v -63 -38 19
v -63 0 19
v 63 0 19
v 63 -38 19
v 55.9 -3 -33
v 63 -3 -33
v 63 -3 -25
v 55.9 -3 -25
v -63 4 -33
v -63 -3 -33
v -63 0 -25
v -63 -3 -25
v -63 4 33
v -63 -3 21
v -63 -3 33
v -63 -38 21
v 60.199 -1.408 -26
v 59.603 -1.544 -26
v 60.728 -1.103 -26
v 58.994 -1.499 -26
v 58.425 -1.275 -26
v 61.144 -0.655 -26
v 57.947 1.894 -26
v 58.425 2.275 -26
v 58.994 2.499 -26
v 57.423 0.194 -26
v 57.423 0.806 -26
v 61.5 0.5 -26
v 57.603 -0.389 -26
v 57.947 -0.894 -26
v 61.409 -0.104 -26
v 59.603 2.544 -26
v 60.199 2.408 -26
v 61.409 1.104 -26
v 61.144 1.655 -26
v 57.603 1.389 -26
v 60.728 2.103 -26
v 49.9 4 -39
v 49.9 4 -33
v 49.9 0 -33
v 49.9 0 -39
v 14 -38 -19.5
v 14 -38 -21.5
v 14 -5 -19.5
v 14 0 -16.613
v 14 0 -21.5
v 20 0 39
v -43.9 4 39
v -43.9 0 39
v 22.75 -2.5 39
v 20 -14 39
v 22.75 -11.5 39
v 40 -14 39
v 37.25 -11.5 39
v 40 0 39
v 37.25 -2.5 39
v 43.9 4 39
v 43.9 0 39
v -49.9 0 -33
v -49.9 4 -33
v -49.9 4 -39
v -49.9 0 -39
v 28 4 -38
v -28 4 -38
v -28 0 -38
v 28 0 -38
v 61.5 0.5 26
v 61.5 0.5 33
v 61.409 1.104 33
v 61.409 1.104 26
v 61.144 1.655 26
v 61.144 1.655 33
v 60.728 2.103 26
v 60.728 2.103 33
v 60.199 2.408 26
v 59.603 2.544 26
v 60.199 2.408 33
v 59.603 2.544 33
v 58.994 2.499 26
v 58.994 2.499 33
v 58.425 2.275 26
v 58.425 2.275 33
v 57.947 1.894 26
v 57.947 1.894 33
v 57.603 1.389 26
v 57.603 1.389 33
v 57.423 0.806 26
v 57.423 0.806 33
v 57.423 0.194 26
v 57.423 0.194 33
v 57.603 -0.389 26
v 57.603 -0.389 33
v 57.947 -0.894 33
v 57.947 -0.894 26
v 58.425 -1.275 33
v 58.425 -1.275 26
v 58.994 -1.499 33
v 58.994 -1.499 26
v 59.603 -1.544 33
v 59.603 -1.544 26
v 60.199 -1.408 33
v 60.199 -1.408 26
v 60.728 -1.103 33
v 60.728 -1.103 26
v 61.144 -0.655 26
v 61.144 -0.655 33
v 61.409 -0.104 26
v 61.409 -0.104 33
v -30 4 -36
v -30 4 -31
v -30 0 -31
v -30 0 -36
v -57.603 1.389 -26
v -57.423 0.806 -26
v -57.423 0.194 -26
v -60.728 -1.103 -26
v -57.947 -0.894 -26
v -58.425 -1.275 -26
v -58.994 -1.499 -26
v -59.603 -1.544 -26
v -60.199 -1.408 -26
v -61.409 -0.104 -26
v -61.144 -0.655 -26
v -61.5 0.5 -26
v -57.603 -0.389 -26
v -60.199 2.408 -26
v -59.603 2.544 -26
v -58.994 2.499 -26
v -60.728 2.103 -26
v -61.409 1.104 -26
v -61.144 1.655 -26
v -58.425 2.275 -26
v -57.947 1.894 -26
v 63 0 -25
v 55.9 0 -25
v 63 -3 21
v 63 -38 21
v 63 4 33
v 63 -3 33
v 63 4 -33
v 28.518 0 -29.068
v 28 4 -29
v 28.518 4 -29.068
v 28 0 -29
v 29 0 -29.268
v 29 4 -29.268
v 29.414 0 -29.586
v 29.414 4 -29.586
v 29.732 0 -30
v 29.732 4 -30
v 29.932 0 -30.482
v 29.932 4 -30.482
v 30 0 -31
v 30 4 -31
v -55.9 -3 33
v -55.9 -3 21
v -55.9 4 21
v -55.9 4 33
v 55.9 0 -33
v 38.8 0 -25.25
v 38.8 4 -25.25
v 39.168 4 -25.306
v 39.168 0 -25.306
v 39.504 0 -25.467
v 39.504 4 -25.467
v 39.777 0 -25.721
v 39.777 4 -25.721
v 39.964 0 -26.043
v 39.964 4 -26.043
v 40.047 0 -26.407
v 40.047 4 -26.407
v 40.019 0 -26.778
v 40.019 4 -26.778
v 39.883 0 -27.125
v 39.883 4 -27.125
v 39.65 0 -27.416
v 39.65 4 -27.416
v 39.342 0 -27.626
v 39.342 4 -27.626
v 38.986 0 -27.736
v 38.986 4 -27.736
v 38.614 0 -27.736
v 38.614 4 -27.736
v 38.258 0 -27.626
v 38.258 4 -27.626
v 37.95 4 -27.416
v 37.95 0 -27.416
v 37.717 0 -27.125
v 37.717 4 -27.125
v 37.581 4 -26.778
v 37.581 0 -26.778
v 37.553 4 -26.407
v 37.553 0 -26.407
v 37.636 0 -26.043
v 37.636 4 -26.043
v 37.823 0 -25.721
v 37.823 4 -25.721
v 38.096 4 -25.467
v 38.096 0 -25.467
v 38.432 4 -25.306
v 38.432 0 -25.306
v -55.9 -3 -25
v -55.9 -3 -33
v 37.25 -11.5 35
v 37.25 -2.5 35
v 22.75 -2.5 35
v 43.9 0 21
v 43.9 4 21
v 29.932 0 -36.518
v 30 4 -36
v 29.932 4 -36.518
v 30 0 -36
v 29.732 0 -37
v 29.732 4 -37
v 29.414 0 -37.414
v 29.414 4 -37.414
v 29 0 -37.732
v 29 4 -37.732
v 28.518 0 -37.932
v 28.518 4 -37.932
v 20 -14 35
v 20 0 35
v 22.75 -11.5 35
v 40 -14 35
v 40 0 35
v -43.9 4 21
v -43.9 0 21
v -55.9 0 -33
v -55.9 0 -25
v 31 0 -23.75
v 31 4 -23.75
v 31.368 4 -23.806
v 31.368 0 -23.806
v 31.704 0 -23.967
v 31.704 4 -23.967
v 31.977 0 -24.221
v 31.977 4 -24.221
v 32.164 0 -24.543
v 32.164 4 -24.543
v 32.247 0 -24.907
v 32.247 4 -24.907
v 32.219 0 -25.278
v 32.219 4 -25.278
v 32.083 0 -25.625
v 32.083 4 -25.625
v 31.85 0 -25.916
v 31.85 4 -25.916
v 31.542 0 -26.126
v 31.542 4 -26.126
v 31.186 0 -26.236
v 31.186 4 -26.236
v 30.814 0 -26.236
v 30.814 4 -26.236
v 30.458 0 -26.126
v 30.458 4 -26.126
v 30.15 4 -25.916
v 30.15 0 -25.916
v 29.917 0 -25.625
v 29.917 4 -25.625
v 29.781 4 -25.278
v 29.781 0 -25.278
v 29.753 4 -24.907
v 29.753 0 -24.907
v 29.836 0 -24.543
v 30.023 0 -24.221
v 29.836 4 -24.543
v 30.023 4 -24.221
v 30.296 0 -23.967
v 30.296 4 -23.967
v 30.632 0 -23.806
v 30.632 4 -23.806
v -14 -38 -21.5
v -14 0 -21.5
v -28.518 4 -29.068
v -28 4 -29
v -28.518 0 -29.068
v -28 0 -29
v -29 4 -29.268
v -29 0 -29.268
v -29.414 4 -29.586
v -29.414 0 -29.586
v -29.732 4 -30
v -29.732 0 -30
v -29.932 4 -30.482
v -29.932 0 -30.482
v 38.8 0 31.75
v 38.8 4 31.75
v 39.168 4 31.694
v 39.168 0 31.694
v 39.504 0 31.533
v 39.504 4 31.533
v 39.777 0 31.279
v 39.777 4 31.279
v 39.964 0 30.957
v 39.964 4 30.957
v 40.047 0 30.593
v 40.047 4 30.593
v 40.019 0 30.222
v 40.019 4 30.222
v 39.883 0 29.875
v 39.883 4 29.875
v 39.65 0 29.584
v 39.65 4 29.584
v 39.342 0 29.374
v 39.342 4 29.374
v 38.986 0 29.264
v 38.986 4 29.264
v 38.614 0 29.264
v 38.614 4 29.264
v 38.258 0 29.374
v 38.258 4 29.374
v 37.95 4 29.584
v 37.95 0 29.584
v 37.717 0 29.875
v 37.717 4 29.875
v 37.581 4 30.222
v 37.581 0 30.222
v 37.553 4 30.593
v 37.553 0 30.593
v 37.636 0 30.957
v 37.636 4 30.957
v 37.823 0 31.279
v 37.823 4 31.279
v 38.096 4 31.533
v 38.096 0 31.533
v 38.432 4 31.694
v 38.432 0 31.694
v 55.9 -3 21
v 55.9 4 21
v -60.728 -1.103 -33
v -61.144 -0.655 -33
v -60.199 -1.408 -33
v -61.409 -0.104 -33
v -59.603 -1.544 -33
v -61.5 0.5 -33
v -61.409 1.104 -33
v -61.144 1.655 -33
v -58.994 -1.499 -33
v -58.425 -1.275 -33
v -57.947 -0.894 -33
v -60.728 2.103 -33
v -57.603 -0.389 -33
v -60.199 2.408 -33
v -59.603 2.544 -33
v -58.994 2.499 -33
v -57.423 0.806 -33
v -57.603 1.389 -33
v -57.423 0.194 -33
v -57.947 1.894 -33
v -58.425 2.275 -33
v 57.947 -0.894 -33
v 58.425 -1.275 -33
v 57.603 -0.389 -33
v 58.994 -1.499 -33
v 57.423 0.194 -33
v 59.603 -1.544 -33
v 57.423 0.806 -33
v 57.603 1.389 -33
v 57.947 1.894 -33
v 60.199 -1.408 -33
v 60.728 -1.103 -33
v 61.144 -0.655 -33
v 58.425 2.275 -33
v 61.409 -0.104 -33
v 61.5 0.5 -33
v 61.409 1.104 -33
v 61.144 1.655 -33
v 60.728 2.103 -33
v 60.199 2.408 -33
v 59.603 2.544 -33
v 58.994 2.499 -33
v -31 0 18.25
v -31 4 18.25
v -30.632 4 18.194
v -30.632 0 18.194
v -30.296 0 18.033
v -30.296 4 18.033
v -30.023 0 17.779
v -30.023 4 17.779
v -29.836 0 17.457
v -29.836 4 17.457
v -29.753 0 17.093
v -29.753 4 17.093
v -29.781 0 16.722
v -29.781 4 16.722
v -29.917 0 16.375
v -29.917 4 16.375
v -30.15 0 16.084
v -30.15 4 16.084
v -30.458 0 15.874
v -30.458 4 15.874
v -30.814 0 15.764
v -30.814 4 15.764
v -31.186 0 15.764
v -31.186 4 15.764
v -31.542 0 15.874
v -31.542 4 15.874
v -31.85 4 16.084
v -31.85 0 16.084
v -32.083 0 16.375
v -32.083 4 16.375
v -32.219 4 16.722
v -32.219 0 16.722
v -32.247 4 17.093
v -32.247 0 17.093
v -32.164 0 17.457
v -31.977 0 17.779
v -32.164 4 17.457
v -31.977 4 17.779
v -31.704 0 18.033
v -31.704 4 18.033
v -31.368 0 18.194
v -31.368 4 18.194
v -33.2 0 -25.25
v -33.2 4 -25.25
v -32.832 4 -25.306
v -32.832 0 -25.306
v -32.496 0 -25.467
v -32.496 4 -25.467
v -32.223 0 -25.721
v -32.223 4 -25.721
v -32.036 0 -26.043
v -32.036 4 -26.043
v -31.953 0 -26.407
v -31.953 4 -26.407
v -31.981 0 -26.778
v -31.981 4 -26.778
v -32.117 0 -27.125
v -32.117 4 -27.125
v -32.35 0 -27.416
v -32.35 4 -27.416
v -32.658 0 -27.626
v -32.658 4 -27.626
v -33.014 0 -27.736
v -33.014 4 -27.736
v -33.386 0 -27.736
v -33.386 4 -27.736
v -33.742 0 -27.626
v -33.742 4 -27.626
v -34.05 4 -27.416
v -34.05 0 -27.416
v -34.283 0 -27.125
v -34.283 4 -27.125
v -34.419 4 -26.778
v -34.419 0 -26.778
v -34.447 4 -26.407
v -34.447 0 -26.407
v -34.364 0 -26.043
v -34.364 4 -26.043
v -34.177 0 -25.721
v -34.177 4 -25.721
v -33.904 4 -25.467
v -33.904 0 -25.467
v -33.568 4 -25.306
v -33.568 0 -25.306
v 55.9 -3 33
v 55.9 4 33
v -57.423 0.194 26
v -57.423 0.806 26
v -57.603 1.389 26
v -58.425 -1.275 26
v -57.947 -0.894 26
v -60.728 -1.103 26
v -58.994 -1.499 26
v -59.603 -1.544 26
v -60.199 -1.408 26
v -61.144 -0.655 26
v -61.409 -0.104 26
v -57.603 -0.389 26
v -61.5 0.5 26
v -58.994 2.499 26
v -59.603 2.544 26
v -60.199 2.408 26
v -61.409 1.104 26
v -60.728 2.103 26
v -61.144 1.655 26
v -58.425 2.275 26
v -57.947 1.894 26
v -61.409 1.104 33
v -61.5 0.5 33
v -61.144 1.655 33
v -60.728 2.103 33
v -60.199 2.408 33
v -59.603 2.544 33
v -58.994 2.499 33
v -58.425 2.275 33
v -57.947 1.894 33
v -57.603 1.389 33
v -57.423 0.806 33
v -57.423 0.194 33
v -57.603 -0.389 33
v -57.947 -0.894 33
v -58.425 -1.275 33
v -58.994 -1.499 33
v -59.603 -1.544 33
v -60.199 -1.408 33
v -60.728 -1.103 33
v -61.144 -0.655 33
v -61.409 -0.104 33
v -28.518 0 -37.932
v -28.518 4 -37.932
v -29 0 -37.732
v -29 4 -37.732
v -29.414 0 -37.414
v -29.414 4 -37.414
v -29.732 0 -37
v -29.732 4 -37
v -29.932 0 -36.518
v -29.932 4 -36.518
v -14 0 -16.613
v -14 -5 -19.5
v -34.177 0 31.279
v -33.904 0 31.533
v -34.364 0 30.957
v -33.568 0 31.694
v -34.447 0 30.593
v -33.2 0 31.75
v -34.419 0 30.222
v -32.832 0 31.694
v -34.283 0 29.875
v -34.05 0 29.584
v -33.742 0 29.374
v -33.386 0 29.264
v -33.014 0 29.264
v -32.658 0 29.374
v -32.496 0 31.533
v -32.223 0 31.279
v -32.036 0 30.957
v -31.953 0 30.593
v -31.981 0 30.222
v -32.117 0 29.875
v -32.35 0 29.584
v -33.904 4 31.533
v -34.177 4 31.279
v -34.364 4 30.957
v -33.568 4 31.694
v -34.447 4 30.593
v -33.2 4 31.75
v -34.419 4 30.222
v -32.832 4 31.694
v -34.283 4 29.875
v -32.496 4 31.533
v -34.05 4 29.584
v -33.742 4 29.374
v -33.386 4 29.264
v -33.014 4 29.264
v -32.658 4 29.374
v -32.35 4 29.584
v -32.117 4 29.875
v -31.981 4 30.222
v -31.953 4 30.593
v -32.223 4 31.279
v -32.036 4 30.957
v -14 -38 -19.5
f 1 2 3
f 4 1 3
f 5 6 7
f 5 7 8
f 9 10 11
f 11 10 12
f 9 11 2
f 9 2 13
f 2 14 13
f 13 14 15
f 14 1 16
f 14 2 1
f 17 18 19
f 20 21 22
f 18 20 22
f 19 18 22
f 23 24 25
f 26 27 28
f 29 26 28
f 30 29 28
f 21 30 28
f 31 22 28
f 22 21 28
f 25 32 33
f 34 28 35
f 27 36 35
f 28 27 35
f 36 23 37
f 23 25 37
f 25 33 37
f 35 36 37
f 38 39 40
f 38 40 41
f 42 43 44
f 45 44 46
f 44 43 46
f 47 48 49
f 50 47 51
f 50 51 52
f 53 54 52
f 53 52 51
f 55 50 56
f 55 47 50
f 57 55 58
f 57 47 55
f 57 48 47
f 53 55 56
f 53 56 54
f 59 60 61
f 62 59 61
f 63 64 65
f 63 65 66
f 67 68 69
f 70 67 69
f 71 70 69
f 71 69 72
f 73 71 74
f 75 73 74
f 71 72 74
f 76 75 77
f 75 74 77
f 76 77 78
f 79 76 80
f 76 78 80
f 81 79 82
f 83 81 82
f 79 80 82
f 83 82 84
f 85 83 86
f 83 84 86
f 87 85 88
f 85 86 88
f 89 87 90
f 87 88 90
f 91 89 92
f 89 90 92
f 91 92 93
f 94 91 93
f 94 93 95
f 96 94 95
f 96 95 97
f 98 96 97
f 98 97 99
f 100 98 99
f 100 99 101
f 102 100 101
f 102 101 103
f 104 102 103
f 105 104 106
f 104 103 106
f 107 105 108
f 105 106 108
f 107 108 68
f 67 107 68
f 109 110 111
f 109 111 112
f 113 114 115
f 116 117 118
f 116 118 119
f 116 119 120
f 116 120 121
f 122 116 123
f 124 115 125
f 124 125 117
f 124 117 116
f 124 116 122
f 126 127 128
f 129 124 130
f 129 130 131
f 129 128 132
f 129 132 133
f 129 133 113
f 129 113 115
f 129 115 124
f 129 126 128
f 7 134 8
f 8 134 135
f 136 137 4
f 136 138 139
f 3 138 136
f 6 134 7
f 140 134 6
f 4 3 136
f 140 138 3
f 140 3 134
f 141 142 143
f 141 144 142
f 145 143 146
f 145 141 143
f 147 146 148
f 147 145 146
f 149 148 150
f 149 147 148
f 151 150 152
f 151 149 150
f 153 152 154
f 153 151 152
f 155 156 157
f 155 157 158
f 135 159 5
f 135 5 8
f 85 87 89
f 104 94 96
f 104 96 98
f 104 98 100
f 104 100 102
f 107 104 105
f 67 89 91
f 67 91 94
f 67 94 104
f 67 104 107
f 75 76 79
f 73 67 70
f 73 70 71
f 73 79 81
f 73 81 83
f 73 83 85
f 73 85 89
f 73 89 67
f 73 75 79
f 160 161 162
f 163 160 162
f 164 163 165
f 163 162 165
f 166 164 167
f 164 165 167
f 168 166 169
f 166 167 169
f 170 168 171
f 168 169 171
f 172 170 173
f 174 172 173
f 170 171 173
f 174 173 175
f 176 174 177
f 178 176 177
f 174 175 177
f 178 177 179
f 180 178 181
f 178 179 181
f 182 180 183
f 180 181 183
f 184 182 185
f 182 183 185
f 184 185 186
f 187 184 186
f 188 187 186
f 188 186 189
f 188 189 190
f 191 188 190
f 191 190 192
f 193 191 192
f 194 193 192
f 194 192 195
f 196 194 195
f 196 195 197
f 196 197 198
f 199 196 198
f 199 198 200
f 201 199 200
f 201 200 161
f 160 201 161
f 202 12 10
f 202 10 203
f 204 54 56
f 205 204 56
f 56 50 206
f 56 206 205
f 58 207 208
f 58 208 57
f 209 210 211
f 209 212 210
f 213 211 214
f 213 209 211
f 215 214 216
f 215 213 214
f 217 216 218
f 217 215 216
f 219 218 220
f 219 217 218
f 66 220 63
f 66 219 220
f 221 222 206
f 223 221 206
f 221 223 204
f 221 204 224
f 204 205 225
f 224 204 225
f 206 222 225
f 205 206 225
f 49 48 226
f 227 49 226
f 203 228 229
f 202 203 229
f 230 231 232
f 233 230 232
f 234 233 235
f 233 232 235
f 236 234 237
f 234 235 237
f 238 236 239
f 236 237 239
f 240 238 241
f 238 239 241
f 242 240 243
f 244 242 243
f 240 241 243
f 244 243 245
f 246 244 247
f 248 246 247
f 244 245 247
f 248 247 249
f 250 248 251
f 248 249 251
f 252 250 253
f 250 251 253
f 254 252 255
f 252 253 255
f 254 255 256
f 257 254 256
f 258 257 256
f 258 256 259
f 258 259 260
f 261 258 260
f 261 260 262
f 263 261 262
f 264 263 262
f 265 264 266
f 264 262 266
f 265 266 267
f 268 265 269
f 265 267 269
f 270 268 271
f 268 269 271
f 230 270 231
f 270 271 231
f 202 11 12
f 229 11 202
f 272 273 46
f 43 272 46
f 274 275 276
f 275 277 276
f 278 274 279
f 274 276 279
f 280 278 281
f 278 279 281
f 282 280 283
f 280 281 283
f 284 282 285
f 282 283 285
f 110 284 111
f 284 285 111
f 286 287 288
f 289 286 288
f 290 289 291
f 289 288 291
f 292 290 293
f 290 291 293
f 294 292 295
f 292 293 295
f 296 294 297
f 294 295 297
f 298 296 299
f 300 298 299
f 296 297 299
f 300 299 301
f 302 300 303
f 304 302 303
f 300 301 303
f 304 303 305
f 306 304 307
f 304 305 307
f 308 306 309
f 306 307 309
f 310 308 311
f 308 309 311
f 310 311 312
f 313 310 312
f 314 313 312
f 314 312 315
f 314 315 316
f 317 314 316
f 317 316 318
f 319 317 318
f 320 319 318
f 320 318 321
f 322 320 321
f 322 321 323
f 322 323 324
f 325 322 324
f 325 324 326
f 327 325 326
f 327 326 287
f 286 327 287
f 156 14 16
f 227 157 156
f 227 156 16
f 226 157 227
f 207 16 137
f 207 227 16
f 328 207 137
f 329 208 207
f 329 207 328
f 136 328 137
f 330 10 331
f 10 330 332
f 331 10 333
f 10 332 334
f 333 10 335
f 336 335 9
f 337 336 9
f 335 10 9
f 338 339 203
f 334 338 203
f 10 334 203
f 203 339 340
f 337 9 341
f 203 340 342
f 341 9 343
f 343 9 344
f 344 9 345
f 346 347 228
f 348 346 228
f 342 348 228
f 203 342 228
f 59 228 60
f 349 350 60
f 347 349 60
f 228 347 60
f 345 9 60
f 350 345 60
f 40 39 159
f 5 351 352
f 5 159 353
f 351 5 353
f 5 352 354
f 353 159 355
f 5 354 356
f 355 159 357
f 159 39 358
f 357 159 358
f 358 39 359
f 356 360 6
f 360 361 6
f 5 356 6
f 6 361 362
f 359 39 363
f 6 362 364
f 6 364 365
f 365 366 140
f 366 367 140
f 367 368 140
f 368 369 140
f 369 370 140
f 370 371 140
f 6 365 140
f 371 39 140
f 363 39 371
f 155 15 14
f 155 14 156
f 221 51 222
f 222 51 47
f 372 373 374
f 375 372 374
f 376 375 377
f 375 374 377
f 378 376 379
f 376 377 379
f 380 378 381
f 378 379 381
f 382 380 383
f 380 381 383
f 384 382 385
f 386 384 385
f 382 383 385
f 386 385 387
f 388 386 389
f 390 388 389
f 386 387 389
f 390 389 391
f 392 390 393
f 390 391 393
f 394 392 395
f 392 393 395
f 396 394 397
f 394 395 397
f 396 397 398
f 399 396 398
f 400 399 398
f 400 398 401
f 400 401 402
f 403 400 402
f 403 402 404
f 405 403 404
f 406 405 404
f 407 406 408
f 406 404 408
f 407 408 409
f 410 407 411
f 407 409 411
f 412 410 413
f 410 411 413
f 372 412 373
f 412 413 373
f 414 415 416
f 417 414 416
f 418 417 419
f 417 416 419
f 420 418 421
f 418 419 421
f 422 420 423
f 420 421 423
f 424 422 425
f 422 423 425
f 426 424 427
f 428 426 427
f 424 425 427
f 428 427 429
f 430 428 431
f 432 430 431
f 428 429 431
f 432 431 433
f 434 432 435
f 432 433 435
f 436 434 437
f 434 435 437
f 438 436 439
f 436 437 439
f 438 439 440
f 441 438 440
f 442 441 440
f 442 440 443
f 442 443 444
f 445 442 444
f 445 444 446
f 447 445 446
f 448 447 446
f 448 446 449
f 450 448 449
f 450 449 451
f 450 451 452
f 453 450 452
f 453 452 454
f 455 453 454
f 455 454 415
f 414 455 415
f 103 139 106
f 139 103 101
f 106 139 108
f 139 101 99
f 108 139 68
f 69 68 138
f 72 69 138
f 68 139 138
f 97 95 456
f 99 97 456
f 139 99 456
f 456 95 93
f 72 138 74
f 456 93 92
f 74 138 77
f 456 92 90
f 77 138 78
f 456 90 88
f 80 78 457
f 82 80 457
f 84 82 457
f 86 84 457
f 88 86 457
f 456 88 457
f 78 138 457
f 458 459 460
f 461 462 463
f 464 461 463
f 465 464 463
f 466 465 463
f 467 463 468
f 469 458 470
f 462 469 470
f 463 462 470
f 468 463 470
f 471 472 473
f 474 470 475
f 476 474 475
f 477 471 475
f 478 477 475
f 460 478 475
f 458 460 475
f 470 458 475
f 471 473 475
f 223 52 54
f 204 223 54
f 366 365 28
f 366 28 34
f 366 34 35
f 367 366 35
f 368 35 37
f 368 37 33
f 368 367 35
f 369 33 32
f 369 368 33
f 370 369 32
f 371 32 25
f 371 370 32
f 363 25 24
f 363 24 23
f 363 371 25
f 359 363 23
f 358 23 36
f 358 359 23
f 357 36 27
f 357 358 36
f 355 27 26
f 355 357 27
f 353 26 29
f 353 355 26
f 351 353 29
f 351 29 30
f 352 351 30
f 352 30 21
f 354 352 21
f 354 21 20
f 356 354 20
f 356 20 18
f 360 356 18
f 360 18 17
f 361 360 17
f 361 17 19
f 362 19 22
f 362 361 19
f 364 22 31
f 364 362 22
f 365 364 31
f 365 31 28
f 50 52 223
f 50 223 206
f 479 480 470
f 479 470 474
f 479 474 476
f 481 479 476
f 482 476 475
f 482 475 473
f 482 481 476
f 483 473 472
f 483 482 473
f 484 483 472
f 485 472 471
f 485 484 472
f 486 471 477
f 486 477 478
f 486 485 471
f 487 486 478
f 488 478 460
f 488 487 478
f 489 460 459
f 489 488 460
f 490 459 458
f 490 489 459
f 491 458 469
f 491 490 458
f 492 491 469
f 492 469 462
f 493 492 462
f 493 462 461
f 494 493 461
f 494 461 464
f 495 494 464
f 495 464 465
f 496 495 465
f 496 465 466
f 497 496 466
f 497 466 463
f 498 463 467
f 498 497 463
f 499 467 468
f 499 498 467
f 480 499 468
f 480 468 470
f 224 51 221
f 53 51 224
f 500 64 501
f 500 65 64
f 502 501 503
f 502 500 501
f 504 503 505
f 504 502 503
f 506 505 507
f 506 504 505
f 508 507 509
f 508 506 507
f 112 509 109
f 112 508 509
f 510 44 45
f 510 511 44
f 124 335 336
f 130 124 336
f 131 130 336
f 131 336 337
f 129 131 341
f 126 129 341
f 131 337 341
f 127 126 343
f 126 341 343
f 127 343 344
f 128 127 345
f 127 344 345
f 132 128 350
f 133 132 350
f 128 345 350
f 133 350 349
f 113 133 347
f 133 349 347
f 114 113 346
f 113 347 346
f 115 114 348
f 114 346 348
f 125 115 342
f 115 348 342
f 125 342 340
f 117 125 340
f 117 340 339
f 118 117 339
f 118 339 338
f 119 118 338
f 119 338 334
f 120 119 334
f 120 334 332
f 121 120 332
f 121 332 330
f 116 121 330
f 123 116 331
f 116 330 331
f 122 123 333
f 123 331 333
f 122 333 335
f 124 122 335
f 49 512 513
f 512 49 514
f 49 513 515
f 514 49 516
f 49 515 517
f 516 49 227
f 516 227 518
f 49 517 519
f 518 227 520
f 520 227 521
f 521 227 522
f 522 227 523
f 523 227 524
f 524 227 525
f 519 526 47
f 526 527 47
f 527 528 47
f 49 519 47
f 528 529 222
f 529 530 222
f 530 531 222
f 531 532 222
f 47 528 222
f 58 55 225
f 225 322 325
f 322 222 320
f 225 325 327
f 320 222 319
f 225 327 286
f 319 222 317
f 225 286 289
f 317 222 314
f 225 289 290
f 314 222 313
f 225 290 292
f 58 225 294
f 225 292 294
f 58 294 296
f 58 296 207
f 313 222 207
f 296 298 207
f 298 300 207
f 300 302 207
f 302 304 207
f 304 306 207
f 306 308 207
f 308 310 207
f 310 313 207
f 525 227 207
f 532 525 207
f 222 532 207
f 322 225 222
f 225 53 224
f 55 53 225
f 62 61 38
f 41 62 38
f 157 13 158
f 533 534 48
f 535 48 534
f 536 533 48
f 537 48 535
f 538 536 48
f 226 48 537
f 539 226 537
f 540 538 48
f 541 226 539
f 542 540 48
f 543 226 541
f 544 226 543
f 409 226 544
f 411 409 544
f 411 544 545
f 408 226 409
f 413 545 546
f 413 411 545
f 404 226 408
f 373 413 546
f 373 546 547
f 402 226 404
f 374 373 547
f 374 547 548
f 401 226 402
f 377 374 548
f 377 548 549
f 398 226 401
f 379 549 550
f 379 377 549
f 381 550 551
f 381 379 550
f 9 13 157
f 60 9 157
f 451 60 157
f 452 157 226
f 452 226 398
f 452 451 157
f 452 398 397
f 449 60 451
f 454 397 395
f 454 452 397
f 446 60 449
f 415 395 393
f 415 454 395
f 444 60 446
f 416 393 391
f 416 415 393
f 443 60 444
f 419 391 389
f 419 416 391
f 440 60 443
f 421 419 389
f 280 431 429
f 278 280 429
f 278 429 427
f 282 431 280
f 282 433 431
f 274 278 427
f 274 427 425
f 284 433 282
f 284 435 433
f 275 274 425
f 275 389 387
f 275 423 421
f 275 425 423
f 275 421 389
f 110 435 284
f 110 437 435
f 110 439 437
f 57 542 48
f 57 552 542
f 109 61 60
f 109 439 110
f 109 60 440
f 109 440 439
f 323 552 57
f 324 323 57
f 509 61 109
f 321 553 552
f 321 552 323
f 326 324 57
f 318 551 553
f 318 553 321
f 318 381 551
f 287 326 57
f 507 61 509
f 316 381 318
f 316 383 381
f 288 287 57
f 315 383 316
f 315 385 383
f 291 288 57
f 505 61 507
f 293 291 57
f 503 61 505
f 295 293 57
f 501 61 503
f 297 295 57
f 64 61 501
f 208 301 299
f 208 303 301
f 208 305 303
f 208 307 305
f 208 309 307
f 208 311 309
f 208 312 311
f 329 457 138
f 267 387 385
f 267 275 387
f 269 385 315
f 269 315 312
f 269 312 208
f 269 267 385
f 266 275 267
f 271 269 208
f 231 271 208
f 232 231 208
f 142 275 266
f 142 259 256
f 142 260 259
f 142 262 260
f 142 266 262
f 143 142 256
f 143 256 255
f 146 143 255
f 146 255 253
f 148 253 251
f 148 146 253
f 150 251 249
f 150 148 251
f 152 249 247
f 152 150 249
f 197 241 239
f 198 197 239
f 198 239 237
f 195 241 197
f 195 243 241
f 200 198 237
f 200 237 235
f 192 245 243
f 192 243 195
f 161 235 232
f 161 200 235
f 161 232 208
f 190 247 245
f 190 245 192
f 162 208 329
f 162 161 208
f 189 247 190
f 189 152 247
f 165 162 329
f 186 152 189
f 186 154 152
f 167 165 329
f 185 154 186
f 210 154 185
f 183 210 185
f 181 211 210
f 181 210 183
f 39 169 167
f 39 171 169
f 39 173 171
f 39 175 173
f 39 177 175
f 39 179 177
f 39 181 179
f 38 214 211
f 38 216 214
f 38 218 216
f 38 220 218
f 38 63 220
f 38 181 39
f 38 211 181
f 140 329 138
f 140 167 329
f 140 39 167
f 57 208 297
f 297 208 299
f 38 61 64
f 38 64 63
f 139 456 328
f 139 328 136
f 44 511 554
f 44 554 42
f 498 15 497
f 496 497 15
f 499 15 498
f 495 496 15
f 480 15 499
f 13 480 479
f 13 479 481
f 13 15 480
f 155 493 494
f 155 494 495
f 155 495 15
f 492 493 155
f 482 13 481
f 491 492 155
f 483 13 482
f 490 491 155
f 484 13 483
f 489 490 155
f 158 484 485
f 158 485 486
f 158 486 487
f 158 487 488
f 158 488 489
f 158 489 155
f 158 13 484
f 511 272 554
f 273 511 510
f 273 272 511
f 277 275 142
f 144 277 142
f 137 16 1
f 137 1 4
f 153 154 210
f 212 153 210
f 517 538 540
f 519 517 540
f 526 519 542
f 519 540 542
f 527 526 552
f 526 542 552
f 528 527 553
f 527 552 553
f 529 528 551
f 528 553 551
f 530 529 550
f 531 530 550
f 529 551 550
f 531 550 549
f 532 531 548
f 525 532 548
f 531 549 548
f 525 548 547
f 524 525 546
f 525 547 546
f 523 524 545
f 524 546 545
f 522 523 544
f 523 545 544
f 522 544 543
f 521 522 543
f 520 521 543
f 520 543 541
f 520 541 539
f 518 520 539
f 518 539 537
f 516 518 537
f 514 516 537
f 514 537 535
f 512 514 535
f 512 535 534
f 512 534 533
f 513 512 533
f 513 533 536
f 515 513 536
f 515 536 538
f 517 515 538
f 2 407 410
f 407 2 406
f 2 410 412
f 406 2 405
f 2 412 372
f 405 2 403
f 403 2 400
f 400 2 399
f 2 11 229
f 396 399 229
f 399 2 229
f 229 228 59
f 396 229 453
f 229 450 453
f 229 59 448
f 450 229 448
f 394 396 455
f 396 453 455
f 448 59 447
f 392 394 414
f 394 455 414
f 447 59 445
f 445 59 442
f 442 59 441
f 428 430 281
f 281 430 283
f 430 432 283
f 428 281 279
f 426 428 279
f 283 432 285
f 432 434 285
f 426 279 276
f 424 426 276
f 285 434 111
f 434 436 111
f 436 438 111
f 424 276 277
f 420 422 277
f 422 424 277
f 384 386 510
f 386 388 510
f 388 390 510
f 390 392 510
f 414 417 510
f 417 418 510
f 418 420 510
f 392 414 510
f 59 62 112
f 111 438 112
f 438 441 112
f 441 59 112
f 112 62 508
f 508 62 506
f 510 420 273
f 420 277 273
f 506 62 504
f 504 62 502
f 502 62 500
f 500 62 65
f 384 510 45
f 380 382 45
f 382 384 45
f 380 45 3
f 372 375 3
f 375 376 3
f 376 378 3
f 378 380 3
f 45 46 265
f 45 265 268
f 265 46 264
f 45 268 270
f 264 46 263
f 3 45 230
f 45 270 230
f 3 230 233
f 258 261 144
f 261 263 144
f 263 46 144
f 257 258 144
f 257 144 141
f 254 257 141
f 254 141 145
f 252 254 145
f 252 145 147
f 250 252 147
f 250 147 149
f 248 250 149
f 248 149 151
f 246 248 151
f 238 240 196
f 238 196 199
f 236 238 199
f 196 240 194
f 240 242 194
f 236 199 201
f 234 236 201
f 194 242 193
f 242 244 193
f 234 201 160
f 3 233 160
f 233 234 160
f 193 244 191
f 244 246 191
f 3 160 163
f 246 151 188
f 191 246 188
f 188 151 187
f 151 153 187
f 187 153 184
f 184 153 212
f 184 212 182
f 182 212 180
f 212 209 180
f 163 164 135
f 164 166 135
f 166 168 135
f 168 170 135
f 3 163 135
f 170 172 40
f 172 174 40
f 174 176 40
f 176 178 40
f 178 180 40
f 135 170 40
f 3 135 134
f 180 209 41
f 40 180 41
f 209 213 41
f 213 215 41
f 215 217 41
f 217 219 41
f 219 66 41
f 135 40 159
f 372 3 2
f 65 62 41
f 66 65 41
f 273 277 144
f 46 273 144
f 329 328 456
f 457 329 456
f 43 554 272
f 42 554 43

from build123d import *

# Parameters (mm, degrees)
BOSS_EXTRUDE1_DEPTH             = 4
SKETCH3_W                       = 7.1
SKETCH3_H                       = 8
BOSS_EXTRUDE3_DEPTH             = 3
SKETCH4_R                       = 2.05
CUT_EXTRUDE1_DEPTH              = 7
MIRROR2_COPY_1_SKETCH_W         = 7.1
MIRROR2_COPY_1_SKETCH_H         = 8
MIRROR2_COPY_1_DEPTH            = 3
MIRROR2_COPY_2_SKETCH_R         = 2.05
MIRROR2_COPY_2_DEPTH            = 7
SKETCH5_W                       = 60
SKETCH5_H                       = 9
CUT_EXTRUDE2_DEPTH              = 75.953318806
FILLET1_R                       = 2
SKETCH7_W                       = 111.8
SKETCH7_H                       = 1
CUT_EXTRUDE3_DEPTH              = 75.953318806
SKETCH8_W                       = 126
SKETCH8_H                       = 2
BOSS_EXTRUDE4_DEPTH             = 38
SKETCH9_W                       = 12
SKETCH9_H                       = 18
CUT_EXTRUDE4_DEPTH              = 10
SKETCH10_W                      = 7.1
SKETCH10_H                      = 4
BOSS_EXTRUDE5_DEPTH             = 3
SKETCH12_W                      = 1.5
SKETCH12_H                      = 4
BOSS_EXTRUDE6_DEPTH             = 2
SKETCH13_W                      = 40
SKETCH13_H                      = 2
BOSS_EXTRUDE7_DEPTH             = 38
SKETCH14_W                      = 1.5
SKETCH14_H                      = 4
BOSS_EXTRUDE8_DEPTH             = 1
BOSS_EXTRUDE9_REACH             = 85.271
BOSS_EXTRUDE9_DIRECTION_2_REACH = 85.271
SKETCH16_W                      = 20
SKETCH16_H                      = 14
SKETCH16_W_2                    = 14.5
SKETCH16_H_2                    = 9
BOSS_EXTRUDE10_DEPTH            = 4
SKETCH17_W                      = 12
SKETCH17_H                      = 18
CUT_EXTRUDE5_DEPTH              = 84.270643086
SKETCH18_W                      = 6
SKETCH18_H                      = 6
CUT_EXTRUDE6_DEPTH              = 86.170417399
SKETCH22_R                      = 1.25
CUT_EXTRUDE7_DEPTH              = 4
SKETCH25_W                      = 6
SKETCH25_H                      = 38
CUT_EXTRUDE11_DEPTH             = 10
CUT_EXTRUDE12_DEPTH             = 85.029756634
CUT_EXTRUDE12_DEPTH_BACK        = 85.029756634
SKETCH26_W                      = 5.701552738
SKETCH26_H                      = 30.562488548
SKETCH26_W_2                    = 7.53419365
SKETCH26_H_2                    = 28.524331859
SKETCH27_R                      = 1.25
CUT_EXTRUDE13_DEPTH             = 86.170417399


with BuildPart() as part:
    # Sketch1 → Boss-Extrude1 (new body)
    with BuildSketch(Plane(origin=(0, 0, 0), x_dir=(1, 0, 0), z_dir=(0, 1, 0))):
        Polygon((-63, -33), (-55.9, -33), (-55.9, -40), (55.9, -40), (55.9, -33), (63, -33), (63, 33), (55.9, 33), (55.9, 40), (-55.9, 40), (-55.9, 33), (-63, 33), align=None)
    extrude(amount=BOSS_EXTRUDE1_DEPTH)

    # Sketch3 → Boss-Extrude3 (add)
    with BuildSketch(Plane.XZ):
        with Locations((-59.45, -29)):
            Rectangle(SKETCH3_W, SKETCH3_H)
    boss_extrude3 = extrude(amount=BOSS_EXTRUDE3_DEPTH)

    # Sketch4 → Cut-Extrude1 (cut)
    with BuildSketch(Plane(origin=(0, 0, -33), x_dir=(-1, 0, 0), z_dir=(0, 0, -1))):
        with Locations((59.45, 0.5)):
            Circle(SKETCH4_R)
    cut_extrude1 = extrude(amount=-CUT_EXTRUDE1_DEPTH, mode=Mode.SUBTRACT)

    # Mirror1: Boss-Extrude3, Cut-Extrude1 across plane
    add(boss_extrude3.mirror(Plane(origin=(0, 0, 0), x_dir=(0, 0, 1), z_dir=(1, 0, 0))))
    add(cut_extrude1.mirror(Plane(origin=(0, 0, 0), x_dir=(0, 0, 1), z_dir=(1, 0, 0))), mode=Mode.SUBTRACT)

    # Mirror2: Boss-Extrude3, Cut-Extrude1 across plane
    add(boss_extrude3.mirror(Plane.XY))
    add(cut_extrude1.mirror(Plane.XY), mode=Mode.SUBTRACT)

    # Mirror2 copy 1 sketch → Mirror2 copy 1 (add)
    with BuildSketch(Plane(origin=(0, 0, 0), x_dir=(-1, 0, 0), z_dir=(0, -1, 0))):
        with Locations((-59.45, -29)):
            Rectangle(MIRROR2_COPY_1_SKETCH_W, MIRROR2_COPY_1_SKETCH_H)
    extrude(amount=MIRROR2_COPY_1_DEPTH)

    # Mirror2 copy 2 sketch → Mirror2 copy 2 (cut)
    with BuildSketch(Plane.XY.offset(33)):
        with Locations((59.45, 0.5)):
            Circle(MIRROR2_COPY_2_SKETCH_R)
    extrude(amount=-MIRROR2_COPY_2_DEPTH, mode=Mode.SUBTRACT)

    # Sketch5 → Cut-Extrude2 (cut, through all)
    with BuildSketch(Plane(origin=(0, 4, 0), x_dir=(1, 0, 0), z_dir=(0, 1, 0))):
        with Locations((0, 33.5)):
            Rectangle(SKETCH5_W, SKETCH5_H)
    extrude(amount=-CUT_EXTRUDE2_DEPTH, mode=Mode.SUBTRACT)

    # Fillet1
    fillet1_edges = [part.edges().sort_by_distance(p)[0] for p in [
        (-30, 2, -29),
        (-30, 2, -38),
        (30, 2, -38),
        (30, 2, -29),
    ]]
    fillet(fillet1_edges, radius=FILLET1_R)

    # Sketch7 → Cut-Extrude3 (cut, through all)
    with BuildSketch(Plane(origin=(0, 4, 0), x_dir=(1, 0, 0), z_dir=(0, 1, 0))):
        with Locations((0, 39.5)):
            Rectangle(SKETCH7_W, SKETCH7_H)
        with Locations((0, -39.5)):
            Rectangle(SKETCH7_W, SKETCH7_H)
    extrude(amount=-CUT_EXTRUDE3_DEPTH, mode=Mode.SUBTRACT)

    # Sketch8 → Boss-Extrude4 (add)
    with BuildSketch(Plane.XZ):
        with Locations((0, 20)):
            Rectangle(SKETCH8_W, SKETCH8_H)
    extrude(amount=BOSS_EXTRUDE4_DEPTH)

    # Sketch9 → Cut-Extrude4 (cut)
    with BuildSketch(Plane(origin=(0, 4, 0), x_dir=(1, 0, 0), z_dir=(0, 1, 0))):
        with Locations((-49.9, -30)):
            Rectangle(SKETCH9_W, SKETCH9_H)
    extrude(amount=-CUT_EXTRUDE4_DEPTH, mode=Mode.SUBTRACT)

    # Sketch10 → Boss-Extrude5 (add)
    with BuildSketch(Plane.XZ.offset(3)):
        with Locations((-59.45, 23)):
            Rectangle(SKETCH10_W, SKETCH10_H)
        with Locations((59.45, 23)):
            Rectangle(SKETCH10_W, SKETCH10_H)
    extrude(amount=-BOSS_EXTRUDE5_DEPTH)

    # Sketch12 → Boss-Extrude6 (add)
    # profile 1 of 2: a face of its own
    with BuildSketch(Plane.ZY.offset(56)):
        Polygon((21, -5.8), (21, -16.2), (23.7, -13.5), (23.7, -8.5), align=None)
        with Locations((22.35, -11)):
            Rectangle(SKETCH12_W, SKETCH12_H, mode=Mode.SUBTRACT)
    # profile 2 of 2: a face of its own
    with BuildSketch(Plane.ZY.offset(56)):
        Polygon((21, -20.8), (21, -31.2), (23.7, -28.5), (23.7, -23.5), align=None)
        with Locations((22.35, -26)):
            Rectangle(SKETCH12_W, SKETCH12_H, mode=Mode.SUBTRACT)
    boss_extrude6 = extrude(amount=-BOSS_EXTRUDE6_DEPTH)

    # Mirror3: Boss-Extrude6 across plane
    add(boss_extrude6.mirror(Plane(origin=(-49.9, 0, 0), x_dir=(0, 0, 1), z_dir=(1, 0, 0))))

    # Sketch13 → Boss-Extrude7 (add)
    with BuildSketch(Plane.XZ):
        with Locations((0, -20.5)):
            Rectangle(SKETCH13_W, SKETCH13_H)
    extrude(amount=BOSS_EXTRUDE7_DEPTH)

    # Sketch14 → Boss-Extrude8 (add, symmetric)
    # profile 1 of 2: a face of its own
    with BuildSketch(Plane(origin=(0, 0, 0), x_dir=(0, 0, -1), z_dir=(1, 0, 0))):
        Polygon((24.2, -8.5), (21.5, -5.8), (21.5, -16.2), (24.2, -13.5), align=None)
        with Locations((22.85, -11)):
            Rectangle(SKETCH14_W, SKETCH14_H, mode=Mode.SUBTRACT)
    # profile 2 of 2: a face of its own
    with BuildSketch(Plane(origin=(0, 0, 0), x_dir=(0, 0, -1), z_dir=(1, 0, 0))):
        Polygon((24.2, -28.5), (24.2, -23.5), (21.5, -20.8), (21.5, -31.2), align=None)
        with Locations((22.85, -26)):
            Rectangle(SKETCH14_W, SKETCH14_H, mode=Mode.SUBTRACT)
    extrude(amount=BOSS_EXTRUDE8_DEPTH, both=True)

    # Boss-Extrude9: up to this face of the body (flat: up to its plane)
    boss_extrude9_end = Plane(part.part.faces().sort_by_distance((-20, -19, -20.5))[0])
    # Sketch15 → Boss-Extrude9 (add, up to the picked face)
    with BuildSketch(Plane(origin=(0, 0, 0), x_dir=(0, 0, -1), z_dir=(1, 0, 0)), mode=Mode.PRIVATE) as boss_extrude9_sk1:
        Polygon((19.5, 0), (19.5, -5), (16.613248654, 0), align=None)
    boss_extrude9_tool1 = split(extrude(boss_extrude9_sk1.sketch, amount=-BOSS_EXTRUDE9_REACH, mode=Mode.PRIVATE), bisect_by=boss_extrude9_end, keep=Keep.BOTH, mode=Mode.PRIVATE)
    add(boss_extrude9_tool1.solids().sort_by(Axis((0, -1.666667, -18.53775), (-1, 0, 0)))[0])

    # Boss-Extrude9 direction 2: up to this face of the body (flat: up to its plane)
    boss_extrude9_direction_2_end = Plane(part.part.faces().sort_by_distance((20, -19, -20.5))[0])
    # Sketch15 → Boss-Extrude9 direction 2 (add, up to the picked face)
    with BuildSketch(Plane(origin=(0, 0, 0), x_dir=(0, 0, -1), z_dir=(1, 0, 0)), mode=Mode.PRIVATE) as boss_extrude9_direction_2_sk1:
        Polygon((19.5, 0), (19.5, -5), (16.613248654, 0), align=None)
    boss_extrude9_direction_2_tool1 = split(extrude(boss_extrude9_direction_2_sk1.sketch, amount=BOSS_EXTRUDE9_DIRECTION_2_REACH, mode=Mode.PRIVATE), bisect_by=boss_extrude9_direction_2_end, keep=Keep.BOTH, mode=Mode.PRIVATE)
    add(boss_extrude9_direction_2_tool1.solids().sort_by(Axis((0, -1.666667, -18.53775), (1, 0, 0)))[0])

    # Sketch16 → Boss-Extrude10 (add)
    with BuildSketch(Plane.XY.offset(39)):
        with Locations((30, -7)):
            Rectangle(SKETCH16_W, SKETCH16_H)
        with Locations((30, -7)):
            Rectangle(SKETCH16_W_2, SKETCH16_H_2, mode=Mode.SUBTRACT)
    extrude(amount=-BOSS_EXTRUDE10_DEPTH)

    # Sketch17 → Cut-Extrude5 (cut, through all)
    with BuildSketch(Plane.XZ):
        with Locations((49.9, 30)):
            Rectangle(SKETCH17_W, SKETCH17_H)
    extrude(amount=-CUT_EXTRUDE5_DEPTH, mode=Mode.SUBTRACT)

    # Sketch18 → Cut-Extrude6 (cut, through all)
    with BuildSketch(Plane(origin=(0, 4, 0), x_dir=(1, 0, 0), z_dir=(0, 1, 0))):
        with Locations((52.9, 36)):
            Rectangle(SKETCH18_W, SKETCH18_H)
        with Locations((-52.9, 36)):
            Rectangle(SKETCH18_W, SKETCH18_H)
    extrude(amount=-CUT_EXTRUDE6_DEPTH, mode=Mode.SUBTRACT)

    # Sketch22 → Cut-Extrude7 (cut)
    with BuildSketch(Plane(origin=(0, 4, 0), x_dir=(1, 0, 0), z_dir=(0, 1, 0))):
        with Locations(Location((31, 25, 0), (0, 0, 270))):
            Circle(SKETCH22_R)
        with Locations(Location((-31, -17, 0), (0, 0, 270))):
            Circle(SKETCH22_R)
    extrude(amount=-CUT_EXTRUDE7_DEPTH, mode=Mode.SUBTRACT)

    # Sketch25 → Cut-Extrude11 (cut)
    with BuildSketch(Plane(origin=(0, 0, -21.5), x_dir=(-1, 0, 0), z_dir=(0, 0, -1))):
        with Locations((-17, -19)):
            Rectangle(SKETCH25_W, SKETCH25_H)
        with Locations((17, -19)):
            Rectangle(SKETCH25_W, SKETCH25_H)
    extrude(amount=-CUT_EXTRUDE11_DEPTH, mode=Mode.SUBTRACT)

    # Sketch26 → Cut-Extrude12 (cut, two sides: drawn at the far end of the back side and taken through both)
    with BuildSketch(Plane.ZY.offset(1).offset(-CUT_EXTRUDE12_DEPTH_BACK)):
        with Locations((-24.350776369, -21.081244274)):
            Rectangle(SKETCH26_W, SKETCH26_H)
        with Locations((24.767096825, -20.06216593)):
            Rectangle(SKETCH26_W_2, SKETCH26_H_2)
    extrude(amount=CUT_EXTRUDE12_DEPTH + CUT_EXTRUDE12_DEPTH_BACK, mode=Mode.SUBTRACT)

    # Sketch27 → Cut-Extrude13 (cut, through all)
    with BuildSketch(Plane(origin=(0, 4, 0), x_dir=(1, 0, 0), z_dir=(0, 1, 0))):
        with Locations(Location((-33.2, 26.5, 0), (0, 0, 270))):
            Circle(SKETCH27_R)
        with Locations(Location((-33.2, -30.5, 0), (0, 0, 270))):
            Circle(SKETCH27_R)
        with Locations(Location((38.8, -30.5, 0), (0, 0, 270))):
            Circle(SKETCH27_R)
        with Locations(Location((38.8, 26.5, 0), (0, 0, 270))):
            Circle(SKETCH27_R)
    extrude(amount=-CUT_EXTRUDE13_DEPTH, mode=Mode.SUBTRACT)


solid = part.part
